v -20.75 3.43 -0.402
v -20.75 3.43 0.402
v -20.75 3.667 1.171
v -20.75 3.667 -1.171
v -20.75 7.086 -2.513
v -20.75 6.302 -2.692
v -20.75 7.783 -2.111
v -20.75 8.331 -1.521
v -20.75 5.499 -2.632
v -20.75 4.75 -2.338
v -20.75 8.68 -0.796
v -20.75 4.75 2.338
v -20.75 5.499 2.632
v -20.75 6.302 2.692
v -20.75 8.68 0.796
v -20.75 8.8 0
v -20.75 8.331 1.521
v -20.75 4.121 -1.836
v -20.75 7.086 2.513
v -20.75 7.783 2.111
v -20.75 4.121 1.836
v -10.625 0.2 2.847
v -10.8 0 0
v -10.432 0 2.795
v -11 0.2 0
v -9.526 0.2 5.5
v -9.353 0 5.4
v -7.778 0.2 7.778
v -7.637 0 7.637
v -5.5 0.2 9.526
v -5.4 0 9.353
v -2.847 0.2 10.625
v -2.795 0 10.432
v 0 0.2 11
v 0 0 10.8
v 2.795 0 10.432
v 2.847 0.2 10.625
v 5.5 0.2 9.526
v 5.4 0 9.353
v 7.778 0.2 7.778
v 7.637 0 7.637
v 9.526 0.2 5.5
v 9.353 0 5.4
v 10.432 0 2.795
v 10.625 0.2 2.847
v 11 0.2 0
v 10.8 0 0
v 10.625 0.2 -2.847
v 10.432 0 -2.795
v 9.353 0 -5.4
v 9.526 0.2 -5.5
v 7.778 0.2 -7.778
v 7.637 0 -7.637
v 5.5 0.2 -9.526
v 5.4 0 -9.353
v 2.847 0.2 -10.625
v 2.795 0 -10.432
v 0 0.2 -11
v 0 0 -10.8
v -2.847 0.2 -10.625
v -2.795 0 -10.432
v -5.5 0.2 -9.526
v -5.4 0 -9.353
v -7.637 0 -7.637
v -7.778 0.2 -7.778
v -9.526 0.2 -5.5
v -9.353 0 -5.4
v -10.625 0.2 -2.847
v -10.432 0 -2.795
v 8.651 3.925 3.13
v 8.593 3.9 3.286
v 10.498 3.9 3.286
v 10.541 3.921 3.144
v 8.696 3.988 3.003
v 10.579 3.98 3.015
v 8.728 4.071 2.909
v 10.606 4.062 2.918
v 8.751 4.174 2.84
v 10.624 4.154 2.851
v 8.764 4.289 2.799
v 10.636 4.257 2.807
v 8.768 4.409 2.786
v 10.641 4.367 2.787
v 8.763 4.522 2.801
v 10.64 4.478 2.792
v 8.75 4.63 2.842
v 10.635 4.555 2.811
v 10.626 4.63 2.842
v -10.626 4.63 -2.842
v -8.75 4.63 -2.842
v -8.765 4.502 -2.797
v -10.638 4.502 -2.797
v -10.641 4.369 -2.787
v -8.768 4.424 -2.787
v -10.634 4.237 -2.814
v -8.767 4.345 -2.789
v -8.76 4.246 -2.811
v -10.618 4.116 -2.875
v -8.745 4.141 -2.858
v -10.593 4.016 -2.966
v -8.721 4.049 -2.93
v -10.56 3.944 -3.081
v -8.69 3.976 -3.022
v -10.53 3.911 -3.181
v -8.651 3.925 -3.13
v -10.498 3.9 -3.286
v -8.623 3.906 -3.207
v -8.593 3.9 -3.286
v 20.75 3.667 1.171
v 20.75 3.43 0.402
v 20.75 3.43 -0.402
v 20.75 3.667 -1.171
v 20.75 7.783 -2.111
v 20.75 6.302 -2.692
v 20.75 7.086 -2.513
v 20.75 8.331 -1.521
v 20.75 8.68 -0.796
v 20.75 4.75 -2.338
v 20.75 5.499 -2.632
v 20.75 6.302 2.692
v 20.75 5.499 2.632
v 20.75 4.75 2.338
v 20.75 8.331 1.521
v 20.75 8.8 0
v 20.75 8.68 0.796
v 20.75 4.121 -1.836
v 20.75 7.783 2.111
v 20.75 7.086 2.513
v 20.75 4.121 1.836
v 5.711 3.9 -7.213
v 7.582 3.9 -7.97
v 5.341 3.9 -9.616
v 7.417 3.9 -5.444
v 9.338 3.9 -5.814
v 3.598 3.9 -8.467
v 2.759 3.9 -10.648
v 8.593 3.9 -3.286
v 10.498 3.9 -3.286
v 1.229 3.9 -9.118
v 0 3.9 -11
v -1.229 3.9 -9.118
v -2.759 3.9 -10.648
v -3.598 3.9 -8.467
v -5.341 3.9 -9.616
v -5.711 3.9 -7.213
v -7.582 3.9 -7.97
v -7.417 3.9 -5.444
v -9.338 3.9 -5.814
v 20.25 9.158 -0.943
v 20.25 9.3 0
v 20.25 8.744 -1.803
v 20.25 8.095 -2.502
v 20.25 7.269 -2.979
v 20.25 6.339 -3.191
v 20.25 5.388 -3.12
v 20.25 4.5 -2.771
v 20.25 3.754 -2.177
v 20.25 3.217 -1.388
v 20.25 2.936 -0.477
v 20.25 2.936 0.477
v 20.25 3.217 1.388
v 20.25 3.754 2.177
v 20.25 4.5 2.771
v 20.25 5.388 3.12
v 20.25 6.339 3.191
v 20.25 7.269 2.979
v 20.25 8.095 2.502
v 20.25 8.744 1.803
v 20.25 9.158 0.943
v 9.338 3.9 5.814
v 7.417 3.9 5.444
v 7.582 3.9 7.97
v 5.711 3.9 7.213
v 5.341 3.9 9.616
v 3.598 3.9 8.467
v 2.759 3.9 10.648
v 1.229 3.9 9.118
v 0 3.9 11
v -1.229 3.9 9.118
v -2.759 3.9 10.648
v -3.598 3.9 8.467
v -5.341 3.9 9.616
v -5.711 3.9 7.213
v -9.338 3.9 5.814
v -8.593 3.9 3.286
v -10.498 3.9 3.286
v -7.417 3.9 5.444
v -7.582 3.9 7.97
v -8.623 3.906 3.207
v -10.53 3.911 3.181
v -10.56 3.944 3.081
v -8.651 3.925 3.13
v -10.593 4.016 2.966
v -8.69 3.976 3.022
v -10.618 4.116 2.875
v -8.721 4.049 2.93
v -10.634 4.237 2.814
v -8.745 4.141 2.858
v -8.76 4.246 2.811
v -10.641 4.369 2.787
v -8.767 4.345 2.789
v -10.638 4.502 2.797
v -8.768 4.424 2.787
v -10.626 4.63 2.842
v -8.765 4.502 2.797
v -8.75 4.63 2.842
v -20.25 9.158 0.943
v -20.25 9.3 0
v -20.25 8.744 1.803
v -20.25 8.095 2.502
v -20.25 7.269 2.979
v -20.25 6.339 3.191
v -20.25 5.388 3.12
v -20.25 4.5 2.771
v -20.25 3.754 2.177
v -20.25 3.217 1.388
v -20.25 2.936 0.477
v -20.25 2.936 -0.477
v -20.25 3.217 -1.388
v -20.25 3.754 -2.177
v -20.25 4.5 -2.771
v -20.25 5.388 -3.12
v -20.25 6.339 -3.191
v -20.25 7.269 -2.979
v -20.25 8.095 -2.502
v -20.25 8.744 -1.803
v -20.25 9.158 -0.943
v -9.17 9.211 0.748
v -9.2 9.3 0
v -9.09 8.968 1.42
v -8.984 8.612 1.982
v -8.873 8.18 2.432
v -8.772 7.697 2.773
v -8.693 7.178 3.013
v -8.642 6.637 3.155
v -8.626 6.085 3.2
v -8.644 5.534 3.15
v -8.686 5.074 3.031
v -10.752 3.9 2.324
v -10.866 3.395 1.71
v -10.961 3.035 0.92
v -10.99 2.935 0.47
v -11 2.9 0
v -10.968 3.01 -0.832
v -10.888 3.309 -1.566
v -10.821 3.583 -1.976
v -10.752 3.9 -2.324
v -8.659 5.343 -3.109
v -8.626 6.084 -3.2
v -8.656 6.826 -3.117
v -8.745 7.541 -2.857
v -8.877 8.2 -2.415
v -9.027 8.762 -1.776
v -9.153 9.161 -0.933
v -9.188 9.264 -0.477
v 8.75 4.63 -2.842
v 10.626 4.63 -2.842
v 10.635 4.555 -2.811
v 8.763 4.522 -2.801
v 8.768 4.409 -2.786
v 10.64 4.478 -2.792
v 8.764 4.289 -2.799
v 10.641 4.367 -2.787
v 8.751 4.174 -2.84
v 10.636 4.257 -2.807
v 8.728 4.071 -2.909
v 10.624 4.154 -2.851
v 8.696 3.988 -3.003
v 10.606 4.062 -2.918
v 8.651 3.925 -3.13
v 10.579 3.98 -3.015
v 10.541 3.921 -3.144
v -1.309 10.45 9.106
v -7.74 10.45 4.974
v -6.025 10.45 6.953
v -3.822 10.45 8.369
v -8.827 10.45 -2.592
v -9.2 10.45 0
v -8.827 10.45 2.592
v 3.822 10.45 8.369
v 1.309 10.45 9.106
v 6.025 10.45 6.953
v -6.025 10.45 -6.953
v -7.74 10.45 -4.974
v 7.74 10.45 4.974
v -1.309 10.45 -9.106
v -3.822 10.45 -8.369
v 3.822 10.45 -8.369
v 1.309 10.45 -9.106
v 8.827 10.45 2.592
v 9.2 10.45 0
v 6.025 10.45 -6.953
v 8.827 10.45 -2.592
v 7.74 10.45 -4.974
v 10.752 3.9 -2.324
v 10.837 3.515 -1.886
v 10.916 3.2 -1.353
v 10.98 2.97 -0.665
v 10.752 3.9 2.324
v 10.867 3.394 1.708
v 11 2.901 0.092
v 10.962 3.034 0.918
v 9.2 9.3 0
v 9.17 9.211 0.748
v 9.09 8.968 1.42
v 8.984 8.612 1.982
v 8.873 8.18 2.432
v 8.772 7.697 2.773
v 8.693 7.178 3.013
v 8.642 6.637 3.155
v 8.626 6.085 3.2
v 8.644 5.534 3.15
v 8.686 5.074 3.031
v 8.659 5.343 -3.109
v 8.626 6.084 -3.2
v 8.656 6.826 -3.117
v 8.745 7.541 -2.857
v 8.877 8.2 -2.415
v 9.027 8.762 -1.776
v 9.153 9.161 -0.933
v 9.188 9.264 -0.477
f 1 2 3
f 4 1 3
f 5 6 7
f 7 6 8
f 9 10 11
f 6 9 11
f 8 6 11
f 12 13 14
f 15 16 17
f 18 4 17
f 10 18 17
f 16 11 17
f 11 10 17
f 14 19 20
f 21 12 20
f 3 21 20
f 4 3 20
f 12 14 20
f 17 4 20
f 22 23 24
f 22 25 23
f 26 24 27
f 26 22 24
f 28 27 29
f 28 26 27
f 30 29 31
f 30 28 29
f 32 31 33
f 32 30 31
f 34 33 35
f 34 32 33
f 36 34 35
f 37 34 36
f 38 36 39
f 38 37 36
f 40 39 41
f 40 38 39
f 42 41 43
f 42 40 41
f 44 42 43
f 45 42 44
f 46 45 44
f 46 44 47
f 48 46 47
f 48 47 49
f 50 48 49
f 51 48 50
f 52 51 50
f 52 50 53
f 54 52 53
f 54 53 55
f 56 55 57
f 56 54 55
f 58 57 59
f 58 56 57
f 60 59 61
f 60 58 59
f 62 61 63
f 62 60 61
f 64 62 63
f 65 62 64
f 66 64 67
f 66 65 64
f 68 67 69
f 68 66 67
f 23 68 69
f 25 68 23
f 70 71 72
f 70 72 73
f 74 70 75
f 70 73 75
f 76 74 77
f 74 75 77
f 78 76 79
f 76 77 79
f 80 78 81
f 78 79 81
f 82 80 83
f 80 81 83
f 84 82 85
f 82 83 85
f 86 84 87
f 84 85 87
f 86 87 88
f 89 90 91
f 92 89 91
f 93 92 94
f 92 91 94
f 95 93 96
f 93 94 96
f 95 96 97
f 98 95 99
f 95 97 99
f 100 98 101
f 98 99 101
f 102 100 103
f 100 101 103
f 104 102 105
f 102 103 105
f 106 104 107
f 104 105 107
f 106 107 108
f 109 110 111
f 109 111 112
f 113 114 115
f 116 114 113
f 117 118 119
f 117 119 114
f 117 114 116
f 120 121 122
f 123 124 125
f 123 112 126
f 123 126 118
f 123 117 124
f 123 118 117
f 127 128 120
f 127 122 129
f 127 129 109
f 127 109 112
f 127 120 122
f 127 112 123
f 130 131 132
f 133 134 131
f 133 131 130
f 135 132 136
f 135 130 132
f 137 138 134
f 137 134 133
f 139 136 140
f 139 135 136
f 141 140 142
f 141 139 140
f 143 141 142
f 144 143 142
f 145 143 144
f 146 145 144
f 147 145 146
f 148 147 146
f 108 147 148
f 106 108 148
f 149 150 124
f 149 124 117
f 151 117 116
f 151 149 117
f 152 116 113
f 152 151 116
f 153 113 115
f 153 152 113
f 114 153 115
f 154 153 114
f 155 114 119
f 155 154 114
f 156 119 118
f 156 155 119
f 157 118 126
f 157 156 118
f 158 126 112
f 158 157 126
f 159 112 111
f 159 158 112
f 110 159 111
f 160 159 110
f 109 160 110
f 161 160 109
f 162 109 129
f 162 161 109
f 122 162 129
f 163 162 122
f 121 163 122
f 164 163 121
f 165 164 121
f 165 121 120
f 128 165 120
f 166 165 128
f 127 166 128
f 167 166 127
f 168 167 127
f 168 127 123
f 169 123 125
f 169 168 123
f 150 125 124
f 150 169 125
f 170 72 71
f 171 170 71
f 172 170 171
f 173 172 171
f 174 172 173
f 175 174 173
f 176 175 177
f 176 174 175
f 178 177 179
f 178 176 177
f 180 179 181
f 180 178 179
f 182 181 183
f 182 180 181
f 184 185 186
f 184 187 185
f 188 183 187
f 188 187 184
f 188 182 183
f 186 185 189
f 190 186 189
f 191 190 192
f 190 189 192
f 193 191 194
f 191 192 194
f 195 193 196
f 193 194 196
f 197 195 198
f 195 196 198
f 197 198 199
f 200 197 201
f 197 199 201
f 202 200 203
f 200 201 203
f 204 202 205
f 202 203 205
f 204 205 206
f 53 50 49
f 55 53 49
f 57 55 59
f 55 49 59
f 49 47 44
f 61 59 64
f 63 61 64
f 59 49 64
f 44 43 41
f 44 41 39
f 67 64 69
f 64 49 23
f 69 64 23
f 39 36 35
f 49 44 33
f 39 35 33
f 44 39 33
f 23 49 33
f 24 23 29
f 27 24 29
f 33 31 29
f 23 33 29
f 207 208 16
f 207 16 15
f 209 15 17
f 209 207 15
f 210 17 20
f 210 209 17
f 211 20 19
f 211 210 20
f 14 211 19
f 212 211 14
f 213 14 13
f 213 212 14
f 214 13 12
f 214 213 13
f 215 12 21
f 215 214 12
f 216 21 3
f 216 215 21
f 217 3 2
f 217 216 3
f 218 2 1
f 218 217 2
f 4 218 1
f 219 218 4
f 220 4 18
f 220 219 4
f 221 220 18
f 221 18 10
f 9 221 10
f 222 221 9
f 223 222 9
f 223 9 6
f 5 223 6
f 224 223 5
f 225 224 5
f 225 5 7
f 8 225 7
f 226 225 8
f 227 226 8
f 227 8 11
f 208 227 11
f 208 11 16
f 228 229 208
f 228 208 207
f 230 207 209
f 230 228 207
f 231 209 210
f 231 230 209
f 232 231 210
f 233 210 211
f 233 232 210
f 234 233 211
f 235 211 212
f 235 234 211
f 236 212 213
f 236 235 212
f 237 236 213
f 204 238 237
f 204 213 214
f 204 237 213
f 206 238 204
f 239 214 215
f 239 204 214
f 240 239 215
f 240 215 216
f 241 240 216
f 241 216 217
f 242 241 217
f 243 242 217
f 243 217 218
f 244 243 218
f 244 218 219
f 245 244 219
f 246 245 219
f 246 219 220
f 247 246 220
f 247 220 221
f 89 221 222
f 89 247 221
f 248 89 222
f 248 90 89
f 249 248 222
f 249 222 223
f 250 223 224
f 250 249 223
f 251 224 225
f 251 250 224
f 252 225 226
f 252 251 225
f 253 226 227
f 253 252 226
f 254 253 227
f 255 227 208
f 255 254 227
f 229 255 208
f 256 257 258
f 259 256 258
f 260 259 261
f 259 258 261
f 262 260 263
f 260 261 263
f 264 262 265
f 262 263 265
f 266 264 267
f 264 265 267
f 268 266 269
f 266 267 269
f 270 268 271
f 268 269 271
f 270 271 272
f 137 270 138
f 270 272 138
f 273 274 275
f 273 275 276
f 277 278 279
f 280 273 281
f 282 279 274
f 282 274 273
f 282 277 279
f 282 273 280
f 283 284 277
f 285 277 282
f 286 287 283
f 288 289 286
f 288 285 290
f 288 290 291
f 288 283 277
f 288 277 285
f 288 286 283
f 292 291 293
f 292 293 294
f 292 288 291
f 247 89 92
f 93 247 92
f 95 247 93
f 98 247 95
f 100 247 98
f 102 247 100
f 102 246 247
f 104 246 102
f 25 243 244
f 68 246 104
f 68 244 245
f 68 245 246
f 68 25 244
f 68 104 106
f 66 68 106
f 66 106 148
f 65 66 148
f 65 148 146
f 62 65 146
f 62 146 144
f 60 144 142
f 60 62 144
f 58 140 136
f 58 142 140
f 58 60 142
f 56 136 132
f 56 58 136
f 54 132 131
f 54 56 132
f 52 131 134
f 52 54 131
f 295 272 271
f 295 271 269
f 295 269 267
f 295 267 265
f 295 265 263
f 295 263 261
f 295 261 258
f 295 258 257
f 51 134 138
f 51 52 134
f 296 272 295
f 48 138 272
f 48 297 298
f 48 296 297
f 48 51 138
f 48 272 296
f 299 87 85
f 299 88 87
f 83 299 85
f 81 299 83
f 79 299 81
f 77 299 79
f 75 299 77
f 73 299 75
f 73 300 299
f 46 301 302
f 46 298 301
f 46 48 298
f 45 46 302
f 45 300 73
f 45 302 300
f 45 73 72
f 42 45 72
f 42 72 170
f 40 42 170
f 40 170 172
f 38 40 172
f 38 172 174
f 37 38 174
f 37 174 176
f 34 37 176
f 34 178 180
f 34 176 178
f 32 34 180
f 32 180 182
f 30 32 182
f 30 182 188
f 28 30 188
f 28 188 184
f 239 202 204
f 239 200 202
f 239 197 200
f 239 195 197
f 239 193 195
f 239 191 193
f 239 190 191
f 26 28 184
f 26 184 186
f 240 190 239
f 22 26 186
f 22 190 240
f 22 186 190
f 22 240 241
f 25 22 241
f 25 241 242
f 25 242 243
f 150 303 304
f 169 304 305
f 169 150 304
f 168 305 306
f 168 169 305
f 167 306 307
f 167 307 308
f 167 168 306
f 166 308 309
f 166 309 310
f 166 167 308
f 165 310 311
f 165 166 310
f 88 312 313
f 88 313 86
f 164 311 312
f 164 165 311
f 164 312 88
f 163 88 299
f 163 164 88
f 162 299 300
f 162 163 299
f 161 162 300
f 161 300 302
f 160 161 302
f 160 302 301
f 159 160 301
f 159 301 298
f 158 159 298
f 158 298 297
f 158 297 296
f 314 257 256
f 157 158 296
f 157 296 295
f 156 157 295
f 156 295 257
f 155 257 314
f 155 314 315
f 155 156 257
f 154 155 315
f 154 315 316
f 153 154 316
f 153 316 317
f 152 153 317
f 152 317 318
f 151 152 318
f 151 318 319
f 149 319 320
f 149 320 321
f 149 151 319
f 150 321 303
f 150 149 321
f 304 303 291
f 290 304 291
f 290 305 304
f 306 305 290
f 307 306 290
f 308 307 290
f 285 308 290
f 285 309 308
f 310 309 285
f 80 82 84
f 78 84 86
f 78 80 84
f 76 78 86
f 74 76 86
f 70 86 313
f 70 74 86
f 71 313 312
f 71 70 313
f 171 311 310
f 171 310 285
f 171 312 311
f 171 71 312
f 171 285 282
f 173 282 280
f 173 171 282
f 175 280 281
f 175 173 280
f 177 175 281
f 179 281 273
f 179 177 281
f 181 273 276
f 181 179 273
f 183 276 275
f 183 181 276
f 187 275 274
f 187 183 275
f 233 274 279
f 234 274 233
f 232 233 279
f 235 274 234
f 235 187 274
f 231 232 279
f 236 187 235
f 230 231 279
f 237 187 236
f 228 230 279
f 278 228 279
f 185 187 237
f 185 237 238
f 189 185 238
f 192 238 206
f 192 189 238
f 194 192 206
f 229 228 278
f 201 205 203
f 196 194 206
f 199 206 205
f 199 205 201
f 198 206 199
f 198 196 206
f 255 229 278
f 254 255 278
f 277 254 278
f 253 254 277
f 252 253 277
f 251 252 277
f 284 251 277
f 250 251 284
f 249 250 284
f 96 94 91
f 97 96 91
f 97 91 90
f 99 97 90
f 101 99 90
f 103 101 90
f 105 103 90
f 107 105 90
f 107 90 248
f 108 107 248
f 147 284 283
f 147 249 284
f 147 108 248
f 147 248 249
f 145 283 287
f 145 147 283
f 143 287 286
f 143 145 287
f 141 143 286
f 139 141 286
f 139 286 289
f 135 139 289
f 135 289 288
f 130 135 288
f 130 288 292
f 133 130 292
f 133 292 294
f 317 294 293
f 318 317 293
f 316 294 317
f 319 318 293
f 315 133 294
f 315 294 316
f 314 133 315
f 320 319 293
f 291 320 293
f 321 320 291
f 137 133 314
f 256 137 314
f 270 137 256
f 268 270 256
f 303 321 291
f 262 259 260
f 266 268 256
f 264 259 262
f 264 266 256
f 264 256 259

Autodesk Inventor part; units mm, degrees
ref_plane "YZ Plane" through (0, 0, 0) normal (1, 0, 0) x (0, 1, 0)
ref_plane "XZ Plane" through (0, 0, 0) normal (0, 1, 0) x (-1, 0, 0)
ref_plane "XY Plane" through (0, 0, 0) normal (0, 0, 1) x (1, 0, 0)
sketch "Sketch1" plane through (0, 0, 0) normal (0, 1, 0) x (-1, 0, 0)
  circle A0 centre (0, 0) radius 11
  dimension "d0" = 22
extrude "Extrusion1" add sketch "Sketch1" along normal blind 3.9
sketch "Sketch2" plane through (0, 3.9, 0) normal (0, 1, 0) x (1, 0, 0)
  circle A0 centre (0, 0) radius 9.2
  dimension "d3" = 18.4
extrude "Extrusion2" add sketch "Sketch2" along normal blind 6.55
sketch "Sketch3" plane through (0, 0, 0) normal (0, 0, 1) x (1, 0, 0)
  line L0 (18.8479, 6.1) -> (-23.7231, 6.1)
  line L1 (11, 0) -> (-11, 0) projected
  line L2 (20.75, 6.1) -> (-20.75, 6.1)
  line L3 (-20.75, 6.1) -> (-20.75, 9.3)
  line L4 (-20.75, 9.3) -> (20.75, 9.3)
  line L5 (20.75, 9.3) -> (20.75, 6.1)
  line L6 (9.2, 10.45) -> (-9.2, 10.45) construction
  line L7 (0, 10.45) -> (0, -1.5119) construction
  point P0 (0, 0)
  point P1 (0, 9.3)
  dimension "d6" = 6.1
  dimension "d7" = 41.5
  dimension "d8" = 3.2
revolve "Revolution1" add sketch "Sketch3" angle 360 about axis through (18.8479, 6.1, 0) along (1, 0, 0)
chamfer "Chamfer1" distance 0.5 angle 45 2 edges at (-20.75, 2.9, 0) (20.75, 2.9, 0)
fillet "Fillet1" radius 0.5 4 edges at (9.8267, 3.9, 2.3238) (9.8267, 3.9, -2.3238) (-9.8267, 3.9, 2.3238) (-9.8267, 3.9, -2.3238)
chamfer "Chamfer2" distance 0.2 angle 45 1 edges at (11, 0, 0)
properties part number "EChem _S200 Cap Top"
